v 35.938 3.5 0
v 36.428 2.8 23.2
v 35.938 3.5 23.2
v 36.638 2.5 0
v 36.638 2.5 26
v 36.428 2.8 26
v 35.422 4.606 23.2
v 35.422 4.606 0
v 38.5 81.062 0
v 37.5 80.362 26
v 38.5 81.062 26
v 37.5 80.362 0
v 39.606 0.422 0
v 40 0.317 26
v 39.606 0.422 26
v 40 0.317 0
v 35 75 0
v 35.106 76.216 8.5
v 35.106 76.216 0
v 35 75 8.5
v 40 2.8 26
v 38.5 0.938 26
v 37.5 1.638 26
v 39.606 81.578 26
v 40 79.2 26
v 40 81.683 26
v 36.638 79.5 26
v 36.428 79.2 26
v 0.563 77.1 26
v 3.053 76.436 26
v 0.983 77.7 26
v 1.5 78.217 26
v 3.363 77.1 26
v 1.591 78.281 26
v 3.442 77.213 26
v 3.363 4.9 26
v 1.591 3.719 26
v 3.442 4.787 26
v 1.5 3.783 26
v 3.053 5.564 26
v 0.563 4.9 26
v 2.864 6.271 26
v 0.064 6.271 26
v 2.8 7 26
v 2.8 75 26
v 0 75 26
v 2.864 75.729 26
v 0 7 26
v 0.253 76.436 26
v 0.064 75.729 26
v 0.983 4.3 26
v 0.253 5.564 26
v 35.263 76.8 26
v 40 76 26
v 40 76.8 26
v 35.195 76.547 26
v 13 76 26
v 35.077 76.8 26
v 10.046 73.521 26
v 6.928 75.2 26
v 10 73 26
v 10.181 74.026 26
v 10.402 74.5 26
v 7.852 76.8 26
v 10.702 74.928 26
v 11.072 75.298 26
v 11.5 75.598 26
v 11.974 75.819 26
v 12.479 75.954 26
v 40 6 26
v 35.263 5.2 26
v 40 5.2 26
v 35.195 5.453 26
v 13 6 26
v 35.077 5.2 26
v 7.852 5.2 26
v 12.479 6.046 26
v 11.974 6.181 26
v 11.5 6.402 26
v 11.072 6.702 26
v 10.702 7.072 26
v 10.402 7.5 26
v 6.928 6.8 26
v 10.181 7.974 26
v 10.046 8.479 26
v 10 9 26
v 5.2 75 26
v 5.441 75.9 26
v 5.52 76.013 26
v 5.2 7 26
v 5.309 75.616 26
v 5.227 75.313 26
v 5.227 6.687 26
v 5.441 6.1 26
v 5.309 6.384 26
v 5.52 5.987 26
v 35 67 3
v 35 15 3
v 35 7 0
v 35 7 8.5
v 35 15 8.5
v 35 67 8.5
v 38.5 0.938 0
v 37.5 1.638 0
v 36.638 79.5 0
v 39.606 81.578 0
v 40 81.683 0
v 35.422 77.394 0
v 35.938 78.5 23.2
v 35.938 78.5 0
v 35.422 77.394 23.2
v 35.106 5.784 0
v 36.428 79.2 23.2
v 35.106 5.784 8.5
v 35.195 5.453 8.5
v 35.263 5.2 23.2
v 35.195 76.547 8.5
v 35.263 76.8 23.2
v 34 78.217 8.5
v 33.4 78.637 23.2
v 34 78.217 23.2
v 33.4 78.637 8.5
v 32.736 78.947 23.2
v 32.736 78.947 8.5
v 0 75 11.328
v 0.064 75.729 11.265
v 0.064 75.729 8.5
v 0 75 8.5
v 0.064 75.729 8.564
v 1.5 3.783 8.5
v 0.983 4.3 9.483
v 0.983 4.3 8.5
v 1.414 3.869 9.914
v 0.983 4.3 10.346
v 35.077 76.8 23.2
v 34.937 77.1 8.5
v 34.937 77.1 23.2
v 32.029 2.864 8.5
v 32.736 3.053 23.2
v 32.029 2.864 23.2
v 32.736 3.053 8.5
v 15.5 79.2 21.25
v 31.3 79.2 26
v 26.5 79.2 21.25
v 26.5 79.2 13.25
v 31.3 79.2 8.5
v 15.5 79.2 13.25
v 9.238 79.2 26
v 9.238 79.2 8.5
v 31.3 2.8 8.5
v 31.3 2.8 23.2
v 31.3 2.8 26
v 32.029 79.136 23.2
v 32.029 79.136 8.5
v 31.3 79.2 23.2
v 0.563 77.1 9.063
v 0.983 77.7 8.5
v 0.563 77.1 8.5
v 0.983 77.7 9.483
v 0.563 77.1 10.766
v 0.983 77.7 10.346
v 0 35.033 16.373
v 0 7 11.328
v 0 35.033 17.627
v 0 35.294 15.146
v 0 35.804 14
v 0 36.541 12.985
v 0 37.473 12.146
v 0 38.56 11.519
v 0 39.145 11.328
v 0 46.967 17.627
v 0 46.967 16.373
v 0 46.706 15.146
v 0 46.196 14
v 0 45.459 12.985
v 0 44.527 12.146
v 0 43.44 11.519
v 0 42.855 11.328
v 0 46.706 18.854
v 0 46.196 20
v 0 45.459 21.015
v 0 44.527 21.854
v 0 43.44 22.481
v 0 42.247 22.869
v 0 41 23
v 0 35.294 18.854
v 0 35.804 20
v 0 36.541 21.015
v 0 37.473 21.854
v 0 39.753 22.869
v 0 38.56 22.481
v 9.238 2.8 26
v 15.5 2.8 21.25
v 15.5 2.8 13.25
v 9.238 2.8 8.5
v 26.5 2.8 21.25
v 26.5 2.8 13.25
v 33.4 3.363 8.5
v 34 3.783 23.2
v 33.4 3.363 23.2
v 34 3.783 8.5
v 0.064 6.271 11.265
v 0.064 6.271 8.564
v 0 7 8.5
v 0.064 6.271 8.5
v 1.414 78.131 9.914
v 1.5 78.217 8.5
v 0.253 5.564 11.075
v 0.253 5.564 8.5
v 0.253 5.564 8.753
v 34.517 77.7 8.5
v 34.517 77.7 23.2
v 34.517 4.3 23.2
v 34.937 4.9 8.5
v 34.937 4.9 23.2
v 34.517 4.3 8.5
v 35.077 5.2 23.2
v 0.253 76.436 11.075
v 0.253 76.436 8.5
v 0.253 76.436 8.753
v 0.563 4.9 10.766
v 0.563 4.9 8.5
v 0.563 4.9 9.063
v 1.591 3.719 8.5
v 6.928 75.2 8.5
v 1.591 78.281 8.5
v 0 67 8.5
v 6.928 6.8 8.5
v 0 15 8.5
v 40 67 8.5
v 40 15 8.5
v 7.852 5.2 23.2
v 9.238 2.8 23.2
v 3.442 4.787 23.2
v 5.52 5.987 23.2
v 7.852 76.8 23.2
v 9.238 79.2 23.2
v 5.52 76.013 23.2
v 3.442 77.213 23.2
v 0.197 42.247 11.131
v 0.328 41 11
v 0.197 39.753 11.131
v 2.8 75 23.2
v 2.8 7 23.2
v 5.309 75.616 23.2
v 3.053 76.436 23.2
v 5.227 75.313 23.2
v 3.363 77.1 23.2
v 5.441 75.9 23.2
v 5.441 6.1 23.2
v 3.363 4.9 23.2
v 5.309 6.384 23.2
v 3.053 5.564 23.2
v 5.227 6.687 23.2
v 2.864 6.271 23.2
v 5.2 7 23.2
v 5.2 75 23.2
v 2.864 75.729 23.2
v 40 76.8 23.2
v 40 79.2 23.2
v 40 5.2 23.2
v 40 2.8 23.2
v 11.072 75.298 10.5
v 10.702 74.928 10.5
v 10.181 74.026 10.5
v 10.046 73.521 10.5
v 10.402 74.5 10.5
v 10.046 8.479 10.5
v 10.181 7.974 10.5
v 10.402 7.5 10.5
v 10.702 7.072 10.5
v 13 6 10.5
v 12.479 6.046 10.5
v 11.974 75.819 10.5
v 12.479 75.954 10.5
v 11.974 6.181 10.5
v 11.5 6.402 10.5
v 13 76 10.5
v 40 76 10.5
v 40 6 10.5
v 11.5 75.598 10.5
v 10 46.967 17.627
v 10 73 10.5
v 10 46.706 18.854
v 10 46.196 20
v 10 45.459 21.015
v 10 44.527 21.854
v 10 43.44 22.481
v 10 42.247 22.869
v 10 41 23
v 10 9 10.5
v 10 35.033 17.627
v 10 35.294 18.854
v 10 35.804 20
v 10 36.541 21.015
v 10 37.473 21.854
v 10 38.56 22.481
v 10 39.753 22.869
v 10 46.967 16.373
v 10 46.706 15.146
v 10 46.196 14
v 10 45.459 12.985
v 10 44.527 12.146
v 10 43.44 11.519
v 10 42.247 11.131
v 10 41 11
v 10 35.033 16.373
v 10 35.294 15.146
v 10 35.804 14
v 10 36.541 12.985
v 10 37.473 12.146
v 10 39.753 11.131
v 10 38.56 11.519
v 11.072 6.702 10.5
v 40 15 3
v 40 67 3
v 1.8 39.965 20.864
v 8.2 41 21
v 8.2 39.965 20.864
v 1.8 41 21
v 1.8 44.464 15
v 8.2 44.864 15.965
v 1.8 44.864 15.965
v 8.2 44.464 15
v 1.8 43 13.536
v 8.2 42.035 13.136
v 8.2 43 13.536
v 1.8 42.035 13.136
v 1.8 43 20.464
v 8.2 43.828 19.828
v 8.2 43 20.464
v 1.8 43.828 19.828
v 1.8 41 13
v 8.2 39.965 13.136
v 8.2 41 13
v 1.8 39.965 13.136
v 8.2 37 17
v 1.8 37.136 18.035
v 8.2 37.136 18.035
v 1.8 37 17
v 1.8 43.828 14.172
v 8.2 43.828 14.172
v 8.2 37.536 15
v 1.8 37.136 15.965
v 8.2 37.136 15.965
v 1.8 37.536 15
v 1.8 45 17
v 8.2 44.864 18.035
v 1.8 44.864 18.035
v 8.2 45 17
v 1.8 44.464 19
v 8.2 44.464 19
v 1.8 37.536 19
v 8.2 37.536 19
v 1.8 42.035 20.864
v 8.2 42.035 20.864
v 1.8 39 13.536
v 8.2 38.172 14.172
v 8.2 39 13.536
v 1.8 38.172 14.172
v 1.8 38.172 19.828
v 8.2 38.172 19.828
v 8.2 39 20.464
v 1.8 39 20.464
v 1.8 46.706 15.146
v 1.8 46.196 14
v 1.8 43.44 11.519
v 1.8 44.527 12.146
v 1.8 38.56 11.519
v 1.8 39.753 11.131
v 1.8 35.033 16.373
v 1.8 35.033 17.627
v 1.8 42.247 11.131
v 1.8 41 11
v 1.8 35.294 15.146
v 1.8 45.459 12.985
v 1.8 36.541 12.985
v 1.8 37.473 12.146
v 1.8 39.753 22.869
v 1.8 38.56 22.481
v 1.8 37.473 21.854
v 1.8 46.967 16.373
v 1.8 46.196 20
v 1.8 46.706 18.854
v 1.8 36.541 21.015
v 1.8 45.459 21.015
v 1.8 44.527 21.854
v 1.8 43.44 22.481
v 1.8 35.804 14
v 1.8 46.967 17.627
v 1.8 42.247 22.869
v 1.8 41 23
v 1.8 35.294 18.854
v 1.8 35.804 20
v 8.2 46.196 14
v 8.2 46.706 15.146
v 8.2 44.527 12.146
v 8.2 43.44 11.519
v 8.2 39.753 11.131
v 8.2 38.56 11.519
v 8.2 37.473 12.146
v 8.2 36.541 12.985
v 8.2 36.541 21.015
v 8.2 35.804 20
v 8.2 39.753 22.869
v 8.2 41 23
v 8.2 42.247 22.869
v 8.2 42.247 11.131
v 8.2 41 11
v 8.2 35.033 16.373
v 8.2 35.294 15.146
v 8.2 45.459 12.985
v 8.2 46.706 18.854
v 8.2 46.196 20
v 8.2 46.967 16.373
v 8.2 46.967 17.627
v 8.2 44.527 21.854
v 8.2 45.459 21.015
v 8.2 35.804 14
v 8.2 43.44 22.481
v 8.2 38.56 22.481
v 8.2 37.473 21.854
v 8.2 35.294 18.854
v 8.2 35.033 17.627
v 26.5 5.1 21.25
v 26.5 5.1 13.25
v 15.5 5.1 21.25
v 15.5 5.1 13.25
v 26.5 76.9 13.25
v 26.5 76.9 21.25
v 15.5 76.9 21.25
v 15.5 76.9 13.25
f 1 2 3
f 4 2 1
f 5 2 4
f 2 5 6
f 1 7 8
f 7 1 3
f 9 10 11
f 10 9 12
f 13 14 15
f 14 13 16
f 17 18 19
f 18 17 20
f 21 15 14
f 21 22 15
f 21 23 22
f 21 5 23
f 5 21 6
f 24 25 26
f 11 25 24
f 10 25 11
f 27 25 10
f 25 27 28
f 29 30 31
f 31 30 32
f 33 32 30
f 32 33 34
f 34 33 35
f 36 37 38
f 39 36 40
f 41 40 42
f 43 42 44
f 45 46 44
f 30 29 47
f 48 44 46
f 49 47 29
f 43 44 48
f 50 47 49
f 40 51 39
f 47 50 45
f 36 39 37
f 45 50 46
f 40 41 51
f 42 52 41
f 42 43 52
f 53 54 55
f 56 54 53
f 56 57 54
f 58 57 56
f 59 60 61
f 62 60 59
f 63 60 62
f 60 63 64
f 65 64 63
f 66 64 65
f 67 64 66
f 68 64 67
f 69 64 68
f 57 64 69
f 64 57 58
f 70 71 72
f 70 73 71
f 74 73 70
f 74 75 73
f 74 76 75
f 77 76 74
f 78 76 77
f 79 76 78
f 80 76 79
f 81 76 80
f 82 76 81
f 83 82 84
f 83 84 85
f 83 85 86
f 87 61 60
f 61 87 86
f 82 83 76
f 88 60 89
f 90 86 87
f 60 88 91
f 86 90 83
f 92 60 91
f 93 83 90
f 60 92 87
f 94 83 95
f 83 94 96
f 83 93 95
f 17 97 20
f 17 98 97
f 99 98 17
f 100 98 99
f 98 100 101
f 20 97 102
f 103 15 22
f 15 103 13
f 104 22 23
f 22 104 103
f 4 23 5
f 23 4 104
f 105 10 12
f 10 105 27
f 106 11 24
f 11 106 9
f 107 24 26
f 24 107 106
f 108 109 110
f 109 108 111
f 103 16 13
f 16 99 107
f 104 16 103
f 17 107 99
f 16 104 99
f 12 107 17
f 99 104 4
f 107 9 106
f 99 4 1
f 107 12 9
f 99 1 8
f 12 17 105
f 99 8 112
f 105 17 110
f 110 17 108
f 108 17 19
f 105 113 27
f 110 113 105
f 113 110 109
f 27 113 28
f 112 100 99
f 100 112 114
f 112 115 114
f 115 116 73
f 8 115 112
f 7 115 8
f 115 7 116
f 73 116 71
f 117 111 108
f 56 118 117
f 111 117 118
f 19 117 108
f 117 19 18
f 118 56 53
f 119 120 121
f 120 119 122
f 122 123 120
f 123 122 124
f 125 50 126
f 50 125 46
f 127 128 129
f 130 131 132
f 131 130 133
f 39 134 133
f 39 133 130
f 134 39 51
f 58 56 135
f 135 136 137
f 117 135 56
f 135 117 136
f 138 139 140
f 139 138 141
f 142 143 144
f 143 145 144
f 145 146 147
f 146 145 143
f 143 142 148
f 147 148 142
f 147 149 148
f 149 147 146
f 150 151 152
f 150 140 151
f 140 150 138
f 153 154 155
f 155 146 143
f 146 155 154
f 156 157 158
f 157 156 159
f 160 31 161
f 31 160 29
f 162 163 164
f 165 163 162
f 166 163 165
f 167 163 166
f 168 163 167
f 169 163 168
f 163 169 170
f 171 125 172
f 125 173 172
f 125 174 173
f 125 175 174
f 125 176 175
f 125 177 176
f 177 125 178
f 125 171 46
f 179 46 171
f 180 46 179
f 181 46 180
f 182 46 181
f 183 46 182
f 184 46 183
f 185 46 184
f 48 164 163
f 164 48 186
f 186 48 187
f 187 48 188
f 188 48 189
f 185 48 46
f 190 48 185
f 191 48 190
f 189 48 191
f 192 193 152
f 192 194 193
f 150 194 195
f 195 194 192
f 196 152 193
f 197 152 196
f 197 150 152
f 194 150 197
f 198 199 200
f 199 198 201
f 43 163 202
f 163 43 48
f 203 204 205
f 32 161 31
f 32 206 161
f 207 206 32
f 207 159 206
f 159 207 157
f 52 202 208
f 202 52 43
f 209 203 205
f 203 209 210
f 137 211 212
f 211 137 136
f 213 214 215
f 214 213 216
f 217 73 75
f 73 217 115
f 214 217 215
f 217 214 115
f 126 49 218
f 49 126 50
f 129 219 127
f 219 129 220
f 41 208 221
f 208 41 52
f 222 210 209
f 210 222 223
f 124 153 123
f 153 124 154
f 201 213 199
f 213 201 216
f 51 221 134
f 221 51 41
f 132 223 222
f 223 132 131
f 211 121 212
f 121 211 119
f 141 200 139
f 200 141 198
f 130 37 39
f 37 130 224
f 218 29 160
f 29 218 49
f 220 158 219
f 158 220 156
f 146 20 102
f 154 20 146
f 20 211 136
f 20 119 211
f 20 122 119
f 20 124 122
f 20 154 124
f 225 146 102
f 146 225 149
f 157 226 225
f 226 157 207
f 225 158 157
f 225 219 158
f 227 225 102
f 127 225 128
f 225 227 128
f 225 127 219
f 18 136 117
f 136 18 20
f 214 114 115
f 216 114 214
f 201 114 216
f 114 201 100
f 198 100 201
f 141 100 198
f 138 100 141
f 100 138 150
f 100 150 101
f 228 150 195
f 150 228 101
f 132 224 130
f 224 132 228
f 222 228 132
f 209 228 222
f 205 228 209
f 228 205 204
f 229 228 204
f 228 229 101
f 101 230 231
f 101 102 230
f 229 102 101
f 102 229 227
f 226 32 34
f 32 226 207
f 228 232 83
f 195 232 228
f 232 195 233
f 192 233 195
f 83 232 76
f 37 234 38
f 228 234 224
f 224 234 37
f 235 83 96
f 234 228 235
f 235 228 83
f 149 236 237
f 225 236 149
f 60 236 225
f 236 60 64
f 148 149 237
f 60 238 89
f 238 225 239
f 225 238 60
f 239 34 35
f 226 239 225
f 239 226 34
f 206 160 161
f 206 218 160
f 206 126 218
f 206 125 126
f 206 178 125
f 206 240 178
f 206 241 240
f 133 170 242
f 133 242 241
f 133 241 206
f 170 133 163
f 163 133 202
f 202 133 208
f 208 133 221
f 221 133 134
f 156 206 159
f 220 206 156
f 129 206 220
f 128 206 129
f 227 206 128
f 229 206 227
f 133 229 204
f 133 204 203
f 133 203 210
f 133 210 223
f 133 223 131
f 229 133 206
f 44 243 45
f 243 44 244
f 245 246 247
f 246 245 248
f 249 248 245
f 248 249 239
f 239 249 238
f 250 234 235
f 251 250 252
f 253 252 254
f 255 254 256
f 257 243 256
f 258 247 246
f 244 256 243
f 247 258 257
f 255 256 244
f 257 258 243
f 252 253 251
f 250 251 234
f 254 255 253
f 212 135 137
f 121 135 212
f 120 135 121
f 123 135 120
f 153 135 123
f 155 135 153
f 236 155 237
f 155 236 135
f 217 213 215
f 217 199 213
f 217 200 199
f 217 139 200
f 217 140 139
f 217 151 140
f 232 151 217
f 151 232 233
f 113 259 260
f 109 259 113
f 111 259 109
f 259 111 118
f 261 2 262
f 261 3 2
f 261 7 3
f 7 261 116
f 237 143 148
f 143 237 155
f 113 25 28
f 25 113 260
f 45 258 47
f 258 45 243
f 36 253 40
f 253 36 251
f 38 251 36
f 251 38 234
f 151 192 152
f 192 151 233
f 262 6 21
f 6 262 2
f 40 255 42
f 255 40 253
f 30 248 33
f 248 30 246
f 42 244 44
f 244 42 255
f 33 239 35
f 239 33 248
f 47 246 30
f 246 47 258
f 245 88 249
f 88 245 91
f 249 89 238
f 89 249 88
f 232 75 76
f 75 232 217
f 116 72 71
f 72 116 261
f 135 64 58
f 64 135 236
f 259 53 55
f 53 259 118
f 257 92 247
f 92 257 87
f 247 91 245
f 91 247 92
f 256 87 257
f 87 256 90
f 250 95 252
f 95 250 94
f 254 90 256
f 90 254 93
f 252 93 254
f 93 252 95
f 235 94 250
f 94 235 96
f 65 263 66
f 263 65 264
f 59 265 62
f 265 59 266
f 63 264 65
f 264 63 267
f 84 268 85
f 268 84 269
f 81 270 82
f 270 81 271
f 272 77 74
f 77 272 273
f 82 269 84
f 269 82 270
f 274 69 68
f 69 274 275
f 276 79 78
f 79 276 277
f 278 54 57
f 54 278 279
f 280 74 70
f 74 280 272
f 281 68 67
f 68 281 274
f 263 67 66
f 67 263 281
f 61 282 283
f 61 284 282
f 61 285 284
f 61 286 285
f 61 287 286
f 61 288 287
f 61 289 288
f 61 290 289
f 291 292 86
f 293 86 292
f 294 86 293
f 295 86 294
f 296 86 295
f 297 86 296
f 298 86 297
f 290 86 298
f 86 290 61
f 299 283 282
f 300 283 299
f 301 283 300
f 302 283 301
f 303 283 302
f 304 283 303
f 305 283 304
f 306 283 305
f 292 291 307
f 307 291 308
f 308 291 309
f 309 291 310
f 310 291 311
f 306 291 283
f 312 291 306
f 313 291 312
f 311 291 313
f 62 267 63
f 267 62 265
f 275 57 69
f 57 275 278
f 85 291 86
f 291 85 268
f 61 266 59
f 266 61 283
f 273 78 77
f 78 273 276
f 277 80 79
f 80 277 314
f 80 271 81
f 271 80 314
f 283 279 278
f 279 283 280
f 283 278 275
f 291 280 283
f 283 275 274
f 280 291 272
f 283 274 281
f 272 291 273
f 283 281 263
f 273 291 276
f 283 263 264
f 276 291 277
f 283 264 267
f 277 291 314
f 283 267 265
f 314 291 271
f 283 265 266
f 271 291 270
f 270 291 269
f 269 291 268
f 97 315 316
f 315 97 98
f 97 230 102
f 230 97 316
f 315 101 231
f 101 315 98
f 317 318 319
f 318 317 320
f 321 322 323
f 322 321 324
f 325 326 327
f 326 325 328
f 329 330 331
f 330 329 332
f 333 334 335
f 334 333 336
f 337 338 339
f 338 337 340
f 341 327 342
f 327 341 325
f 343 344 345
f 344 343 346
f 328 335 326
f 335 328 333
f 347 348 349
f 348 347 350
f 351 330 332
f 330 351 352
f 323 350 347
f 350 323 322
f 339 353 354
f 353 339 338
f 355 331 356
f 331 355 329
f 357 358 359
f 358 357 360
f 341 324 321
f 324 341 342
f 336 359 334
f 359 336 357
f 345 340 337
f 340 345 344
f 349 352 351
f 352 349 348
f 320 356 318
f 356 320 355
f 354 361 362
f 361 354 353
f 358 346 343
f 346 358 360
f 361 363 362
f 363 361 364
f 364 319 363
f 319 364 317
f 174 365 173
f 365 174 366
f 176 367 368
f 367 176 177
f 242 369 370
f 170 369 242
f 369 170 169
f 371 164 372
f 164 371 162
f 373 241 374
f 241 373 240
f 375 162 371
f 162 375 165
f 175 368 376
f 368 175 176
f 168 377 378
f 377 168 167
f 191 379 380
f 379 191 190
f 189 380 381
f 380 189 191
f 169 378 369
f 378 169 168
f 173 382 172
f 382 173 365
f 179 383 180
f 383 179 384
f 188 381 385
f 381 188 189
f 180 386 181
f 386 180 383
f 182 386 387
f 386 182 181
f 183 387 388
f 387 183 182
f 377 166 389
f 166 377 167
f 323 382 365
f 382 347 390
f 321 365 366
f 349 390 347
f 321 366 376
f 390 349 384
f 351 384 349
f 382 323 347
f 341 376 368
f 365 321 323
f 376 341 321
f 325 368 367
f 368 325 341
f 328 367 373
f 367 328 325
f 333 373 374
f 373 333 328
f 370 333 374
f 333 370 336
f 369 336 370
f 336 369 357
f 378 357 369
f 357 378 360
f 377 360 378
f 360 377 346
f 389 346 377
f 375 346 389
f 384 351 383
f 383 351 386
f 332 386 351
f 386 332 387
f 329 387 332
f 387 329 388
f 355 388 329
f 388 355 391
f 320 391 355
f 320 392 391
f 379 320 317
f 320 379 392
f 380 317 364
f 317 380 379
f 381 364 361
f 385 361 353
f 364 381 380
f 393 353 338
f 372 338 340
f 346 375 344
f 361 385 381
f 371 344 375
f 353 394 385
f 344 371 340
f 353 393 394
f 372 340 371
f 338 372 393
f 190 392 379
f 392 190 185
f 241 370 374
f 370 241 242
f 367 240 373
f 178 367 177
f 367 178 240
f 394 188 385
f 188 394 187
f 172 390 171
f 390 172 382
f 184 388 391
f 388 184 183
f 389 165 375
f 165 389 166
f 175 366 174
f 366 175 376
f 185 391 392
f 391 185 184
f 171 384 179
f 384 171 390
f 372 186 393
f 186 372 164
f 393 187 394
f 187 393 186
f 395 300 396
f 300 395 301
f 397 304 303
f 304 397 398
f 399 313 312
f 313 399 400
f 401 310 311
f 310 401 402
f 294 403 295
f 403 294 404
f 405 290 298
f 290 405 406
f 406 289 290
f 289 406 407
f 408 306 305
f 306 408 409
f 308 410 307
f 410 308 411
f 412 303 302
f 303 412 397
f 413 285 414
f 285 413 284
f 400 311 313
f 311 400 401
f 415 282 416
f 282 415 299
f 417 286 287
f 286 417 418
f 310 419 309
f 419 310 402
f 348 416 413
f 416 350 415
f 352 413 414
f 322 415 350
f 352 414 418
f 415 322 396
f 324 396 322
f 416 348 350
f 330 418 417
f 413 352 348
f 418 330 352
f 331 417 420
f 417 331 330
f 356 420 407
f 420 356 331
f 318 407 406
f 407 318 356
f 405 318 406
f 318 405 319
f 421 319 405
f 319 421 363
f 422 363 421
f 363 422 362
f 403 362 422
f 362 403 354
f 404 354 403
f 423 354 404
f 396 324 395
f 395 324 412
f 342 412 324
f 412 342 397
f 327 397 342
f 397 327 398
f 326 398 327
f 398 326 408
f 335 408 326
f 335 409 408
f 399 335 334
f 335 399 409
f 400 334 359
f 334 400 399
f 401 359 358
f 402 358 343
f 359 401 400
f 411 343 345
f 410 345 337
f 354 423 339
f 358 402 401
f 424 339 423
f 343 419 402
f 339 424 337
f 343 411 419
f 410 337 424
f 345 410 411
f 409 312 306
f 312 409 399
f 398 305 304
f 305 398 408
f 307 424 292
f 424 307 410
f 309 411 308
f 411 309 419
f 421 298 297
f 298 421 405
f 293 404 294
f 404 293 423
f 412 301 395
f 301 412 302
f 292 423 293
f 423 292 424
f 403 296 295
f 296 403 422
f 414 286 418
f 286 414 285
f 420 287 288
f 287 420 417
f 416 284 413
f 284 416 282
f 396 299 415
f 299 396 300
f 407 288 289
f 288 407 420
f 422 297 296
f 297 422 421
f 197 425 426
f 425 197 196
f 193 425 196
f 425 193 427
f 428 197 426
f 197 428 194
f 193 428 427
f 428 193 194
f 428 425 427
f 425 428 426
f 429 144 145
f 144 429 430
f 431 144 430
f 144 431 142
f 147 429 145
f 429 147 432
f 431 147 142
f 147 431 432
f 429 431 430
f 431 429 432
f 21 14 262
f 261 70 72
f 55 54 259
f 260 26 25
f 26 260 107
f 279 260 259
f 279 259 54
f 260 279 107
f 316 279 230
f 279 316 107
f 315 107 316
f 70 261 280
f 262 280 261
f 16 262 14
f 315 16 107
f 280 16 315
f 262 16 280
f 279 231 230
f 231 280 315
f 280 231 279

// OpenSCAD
use <collar_halter_v2.scad>

$fn = 36;

intersection() {
    pod_right_base();
    translate([-5, -5, -2])
        cube([45, 90, 40]);
}
